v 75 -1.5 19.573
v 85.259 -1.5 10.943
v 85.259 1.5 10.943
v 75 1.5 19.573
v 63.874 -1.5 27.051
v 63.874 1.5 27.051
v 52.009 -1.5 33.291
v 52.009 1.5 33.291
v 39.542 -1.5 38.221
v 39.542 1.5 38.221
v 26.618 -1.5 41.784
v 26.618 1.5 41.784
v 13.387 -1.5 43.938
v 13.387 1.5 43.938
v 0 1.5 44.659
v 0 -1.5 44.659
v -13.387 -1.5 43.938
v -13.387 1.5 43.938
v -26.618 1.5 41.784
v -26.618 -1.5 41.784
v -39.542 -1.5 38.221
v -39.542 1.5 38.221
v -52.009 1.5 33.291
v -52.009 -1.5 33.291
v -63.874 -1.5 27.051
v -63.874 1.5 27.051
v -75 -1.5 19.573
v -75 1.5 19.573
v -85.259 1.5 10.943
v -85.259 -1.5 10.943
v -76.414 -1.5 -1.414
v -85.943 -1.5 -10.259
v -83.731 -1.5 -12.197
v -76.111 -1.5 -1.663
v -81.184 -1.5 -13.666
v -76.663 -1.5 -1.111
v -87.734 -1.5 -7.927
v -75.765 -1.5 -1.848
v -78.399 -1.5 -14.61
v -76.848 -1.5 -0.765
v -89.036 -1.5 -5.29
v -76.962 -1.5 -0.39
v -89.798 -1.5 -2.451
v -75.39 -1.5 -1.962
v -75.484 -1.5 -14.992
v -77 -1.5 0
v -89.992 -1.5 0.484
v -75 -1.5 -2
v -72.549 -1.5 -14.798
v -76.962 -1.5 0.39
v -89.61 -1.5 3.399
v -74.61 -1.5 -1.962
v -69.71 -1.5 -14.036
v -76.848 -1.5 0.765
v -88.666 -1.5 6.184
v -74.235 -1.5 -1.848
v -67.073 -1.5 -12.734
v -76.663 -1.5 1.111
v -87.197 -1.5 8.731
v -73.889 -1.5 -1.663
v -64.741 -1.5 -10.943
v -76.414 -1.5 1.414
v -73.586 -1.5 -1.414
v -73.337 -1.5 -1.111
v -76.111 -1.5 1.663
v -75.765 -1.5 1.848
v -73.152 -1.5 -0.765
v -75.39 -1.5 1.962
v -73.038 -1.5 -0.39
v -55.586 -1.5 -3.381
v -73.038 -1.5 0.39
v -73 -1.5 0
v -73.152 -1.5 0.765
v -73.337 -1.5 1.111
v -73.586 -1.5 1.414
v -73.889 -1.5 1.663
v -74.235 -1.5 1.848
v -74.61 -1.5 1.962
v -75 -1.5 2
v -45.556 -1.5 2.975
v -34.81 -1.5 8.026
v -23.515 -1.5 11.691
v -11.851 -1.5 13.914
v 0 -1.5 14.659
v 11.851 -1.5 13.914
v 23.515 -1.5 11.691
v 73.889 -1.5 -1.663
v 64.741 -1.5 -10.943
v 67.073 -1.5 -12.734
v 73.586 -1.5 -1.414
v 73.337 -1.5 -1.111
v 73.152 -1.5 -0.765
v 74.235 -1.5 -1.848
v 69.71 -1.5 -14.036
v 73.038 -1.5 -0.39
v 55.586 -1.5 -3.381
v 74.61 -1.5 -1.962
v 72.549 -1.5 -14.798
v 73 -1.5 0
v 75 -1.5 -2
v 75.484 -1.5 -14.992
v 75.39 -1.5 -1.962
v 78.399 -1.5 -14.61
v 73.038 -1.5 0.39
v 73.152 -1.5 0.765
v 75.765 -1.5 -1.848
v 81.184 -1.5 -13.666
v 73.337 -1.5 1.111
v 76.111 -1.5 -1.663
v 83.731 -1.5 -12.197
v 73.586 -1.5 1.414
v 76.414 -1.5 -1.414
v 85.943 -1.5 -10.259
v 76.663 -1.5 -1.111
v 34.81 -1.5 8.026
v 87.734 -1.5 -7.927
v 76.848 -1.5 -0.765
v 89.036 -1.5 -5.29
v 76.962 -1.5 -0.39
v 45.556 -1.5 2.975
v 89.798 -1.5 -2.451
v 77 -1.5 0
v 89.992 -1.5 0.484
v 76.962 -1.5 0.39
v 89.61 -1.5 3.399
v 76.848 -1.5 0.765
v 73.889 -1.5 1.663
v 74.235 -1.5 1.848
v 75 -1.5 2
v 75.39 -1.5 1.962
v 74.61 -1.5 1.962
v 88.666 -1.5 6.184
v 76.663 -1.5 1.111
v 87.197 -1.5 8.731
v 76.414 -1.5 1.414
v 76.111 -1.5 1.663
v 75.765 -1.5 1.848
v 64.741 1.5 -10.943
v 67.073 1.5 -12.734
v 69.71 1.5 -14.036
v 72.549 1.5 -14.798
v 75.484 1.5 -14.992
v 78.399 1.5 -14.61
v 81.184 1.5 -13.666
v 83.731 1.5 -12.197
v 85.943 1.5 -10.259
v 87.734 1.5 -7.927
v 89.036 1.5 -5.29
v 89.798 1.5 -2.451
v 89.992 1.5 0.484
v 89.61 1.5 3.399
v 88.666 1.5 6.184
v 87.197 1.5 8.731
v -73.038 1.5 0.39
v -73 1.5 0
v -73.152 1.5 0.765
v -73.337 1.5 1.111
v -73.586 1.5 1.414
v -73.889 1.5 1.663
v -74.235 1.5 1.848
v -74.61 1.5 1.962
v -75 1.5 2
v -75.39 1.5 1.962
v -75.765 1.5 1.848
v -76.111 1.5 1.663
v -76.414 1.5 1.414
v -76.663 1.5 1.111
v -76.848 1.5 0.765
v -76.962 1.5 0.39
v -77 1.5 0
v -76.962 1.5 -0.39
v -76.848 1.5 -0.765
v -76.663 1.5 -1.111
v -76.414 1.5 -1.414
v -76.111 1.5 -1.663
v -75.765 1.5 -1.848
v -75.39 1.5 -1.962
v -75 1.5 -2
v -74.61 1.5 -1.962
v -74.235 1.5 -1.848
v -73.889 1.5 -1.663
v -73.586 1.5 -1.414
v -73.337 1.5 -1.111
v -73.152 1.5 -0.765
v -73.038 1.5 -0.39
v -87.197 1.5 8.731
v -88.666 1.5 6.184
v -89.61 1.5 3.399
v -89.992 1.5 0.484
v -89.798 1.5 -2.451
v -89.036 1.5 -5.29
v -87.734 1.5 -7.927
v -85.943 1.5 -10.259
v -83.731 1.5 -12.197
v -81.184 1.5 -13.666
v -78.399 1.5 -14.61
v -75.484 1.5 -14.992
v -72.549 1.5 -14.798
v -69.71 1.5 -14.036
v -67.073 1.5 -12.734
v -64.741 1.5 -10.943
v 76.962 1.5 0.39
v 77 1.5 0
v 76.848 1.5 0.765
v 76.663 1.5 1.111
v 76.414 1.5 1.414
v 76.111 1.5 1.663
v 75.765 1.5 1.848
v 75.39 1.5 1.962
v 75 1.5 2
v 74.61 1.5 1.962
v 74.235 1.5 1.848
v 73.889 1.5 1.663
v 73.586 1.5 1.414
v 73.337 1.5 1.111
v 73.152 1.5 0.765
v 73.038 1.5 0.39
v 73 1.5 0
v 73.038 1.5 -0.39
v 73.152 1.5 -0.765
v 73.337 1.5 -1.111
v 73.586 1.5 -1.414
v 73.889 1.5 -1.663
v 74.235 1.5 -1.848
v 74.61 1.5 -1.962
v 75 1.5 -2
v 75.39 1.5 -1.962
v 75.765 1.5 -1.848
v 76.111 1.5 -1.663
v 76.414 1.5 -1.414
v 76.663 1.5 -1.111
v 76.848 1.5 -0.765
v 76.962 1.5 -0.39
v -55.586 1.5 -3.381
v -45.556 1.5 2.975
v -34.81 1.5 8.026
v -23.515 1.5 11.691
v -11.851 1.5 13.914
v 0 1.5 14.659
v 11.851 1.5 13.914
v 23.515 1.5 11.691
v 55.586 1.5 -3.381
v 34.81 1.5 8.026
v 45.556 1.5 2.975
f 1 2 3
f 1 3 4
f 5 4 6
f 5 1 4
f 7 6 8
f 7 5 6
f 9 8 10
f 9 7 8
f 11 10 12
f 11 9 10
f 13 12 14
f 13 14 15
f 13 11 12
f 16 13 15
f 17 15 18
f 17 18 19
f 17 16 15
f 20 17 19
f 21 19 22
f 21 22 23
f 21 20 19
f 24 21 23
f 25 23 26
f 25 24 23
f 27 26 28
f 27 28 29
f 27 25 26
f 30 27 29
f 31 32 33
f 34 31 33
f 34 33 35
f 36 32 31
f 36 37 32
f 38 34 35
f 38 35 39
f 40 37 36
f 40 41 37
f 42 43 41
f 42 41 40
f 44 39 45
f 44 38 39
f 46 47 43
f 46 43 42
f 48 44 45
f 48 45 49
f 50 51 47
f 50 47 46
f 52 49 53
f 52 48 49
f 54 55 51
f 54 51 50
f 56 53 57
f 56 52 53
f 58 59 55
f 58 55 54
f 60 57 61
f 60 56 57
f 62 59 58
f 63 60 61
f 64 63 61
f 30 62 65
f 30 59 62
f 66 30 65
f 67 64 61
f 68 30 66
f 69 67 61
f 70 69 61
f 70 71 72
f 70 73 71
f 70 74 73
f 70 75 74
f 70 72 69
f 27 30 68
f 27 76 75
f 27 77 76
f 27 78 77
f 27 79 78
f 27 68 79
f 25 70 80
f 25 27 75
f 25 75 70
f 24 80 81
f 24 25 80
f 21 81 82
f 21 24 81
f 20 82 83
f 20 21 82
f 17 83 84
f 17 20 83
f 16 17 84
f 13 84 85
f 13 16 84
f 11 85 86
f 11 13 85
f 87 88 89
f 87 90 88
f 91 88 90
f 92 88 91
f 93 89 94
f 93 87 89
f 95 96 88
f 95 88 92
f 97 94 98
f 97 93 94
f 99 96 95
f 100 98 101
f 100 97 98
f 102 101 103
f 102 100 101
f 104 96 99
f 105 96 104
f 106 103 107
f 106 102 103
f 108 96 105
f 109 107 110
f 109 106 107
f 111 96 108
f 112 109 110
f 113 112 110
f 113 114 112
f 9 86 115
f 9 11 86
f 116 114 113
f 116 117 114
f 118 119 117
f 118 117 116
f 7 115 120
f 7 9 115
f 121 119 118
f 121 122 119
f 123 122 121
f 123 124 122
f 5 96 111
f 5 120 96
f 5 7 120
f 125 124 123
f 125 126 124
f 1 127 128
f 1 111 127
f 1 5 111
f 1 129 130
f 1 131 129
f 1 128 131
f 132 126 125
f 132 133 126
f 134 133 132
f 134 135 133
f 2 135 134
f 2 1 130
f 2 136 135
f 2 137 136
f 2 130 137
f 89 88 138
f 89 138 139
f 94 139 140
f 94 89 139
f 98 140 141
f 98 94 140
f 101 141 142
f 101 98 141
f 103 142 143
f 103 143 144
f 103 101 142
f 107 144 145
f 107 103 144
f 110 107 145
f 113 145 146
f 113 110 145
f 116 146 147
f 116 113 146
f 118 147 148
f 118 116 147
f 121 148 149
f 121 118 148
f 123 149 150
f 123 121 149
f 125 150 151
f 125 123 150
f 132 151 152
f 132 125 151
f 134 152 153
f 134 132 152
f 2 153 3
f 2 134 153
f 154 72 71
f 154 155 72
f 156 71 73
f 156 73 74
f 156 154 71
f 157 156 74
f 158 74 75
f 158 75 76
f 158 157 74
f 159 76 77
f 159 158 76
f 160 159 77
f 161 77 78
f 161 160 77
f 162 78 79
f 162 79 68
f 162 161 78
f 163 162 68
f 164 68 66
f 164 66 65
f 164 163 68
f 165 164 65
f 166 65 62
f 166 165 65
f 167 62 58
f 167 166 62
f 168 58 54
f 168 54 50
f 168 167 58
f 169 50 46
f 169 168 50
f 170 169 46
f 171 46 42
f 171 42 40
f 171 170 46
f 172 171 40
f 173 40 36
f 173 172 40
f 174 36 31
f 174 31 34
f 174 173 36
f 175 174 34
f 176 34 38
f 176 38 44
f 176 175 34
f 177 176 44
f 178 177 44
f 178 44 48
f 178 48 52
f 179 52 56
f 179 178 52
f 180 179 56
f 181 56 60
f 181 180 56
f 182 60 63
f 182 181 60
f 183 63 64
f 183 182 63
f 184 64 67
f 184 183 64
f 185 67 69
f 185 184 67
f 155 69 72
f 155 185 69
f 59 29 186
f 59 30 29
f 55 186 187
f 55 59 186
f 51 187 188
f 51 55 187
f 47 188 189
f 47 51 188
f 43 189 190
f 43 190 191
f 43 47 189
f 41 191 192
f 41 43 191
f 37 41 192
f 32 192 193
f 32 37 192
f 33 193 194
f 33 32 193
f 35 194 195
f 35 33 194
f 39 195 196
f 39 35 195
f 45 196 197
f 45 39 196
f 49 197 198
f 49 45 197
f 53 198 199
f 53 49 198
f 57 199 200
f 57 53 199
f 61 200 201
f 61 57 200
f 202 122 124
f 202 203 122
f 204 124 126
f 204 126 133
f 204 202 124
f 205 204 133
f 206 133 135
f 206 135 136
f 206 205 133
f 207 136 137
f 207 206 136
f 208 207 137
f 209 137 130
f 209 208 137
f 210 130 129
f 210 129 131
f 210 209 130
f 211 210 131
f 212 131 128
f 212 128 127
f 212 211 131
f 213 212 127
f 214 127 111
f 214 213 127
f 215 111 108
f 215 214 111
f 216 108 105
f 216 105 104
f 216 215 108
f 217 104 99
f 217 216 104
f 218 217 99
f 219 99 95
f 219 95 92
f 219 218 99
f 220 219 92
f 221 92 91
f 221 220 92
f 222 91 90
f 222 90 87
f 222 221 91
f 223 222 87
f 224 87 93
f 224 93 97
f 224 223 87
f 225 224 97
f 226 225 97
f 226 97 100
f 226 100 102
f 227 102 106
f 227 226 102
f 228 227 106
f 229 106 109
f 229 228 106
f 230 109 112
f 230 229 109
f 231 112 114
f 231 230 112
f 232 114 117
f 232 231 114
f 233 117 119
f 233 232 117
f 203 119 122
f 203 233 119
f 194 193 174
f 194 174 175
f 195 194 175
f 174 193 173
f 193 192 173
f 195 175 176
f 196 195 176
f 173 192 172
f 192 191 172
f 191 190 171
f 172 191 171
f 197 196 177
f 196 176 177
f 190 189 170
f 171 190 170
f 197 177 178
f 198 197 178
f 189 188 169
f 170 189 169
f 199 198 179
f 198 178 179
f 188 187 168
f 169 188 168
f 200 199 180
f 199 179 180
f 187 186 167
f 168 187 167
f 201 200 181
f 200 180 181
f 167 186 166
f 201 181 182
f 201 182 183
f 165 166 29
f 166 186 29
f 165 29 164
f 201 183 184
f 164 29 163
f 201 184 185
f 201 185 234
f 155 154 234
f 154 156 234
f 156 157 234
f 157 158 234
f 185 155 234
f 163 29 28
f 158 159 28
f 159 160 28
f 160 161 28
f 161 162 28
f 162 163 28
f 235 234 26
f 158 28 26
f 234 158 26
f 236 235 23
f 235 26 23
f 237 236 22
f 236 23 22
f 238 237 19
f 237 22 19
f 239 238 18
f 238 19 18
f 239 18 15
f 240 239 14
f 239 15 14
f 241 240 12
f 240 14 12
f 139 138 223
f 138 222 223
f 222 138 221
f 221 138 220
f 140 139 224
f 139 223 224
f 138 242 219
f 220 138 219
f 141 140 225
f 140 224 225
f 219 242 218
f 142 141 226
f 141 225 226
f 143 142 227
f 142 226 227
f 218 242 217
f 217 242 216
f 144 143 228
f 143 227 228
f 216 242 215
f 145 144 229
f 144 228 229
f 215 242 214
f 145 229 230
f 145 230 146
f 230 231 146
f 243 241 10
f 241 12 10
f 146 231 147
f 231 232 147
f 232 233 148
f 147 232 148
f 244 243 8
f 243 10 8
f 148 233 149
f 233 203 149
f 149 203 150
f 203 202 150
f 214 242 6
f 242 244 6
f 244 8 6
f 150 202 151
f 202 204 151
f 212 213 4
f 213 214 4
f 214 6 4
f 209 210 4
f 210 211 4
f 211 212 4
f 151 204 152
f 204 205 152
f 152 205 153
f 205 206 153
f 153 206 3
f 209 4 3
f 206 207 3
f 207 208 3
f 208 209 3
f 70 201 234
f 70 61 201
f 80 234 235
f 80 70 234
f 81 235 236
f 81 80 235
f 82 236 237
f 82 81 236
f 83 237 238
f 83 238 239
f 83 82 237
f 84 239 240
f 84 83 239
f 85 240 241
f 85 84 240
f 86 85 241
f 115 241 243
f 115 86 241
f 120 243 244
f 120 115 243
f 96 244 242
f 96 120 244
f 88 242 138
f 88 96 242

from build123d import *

# Parameters (mm, degrees)
F1_R     = 2
F2_DEPTH = 1.5


with BuildPart() as f2:
    # F1 (on Front) → F2 (new body, symmetric)
    with BuildSketch(Plane.XZ):
        with BuildLine():
            ThreePointArc((-64.7408830668, -10.9430580621), (0, 14.6585609973), (64.7408830668, -10.9430580621))
            ThreePointArc((64.7408830668, -10.9430580621), (85.9430580621, -10.2591169332), (85.2591169332, 10.9430580621))
            ThreePointArc((85.2591169332, 10.9430580621), (0, 44.6585609973), (-85.2591169332, 10.9430580621))
            ThreePointArc((-85.2591169332, 10.9430580621), (-85.9430580621, -10.2591169332), (-64.7408830668, -10.9430580621))
        make_face()
        with Locations((-75, 0)):
            Circle(F1_R, mode=Mode.SUBTRACT)
        with Locations((75, 0)):
            Circle(F1_R, mode=Mode.SUBTRACT)
    extrude(amount=F2_DEPTH, both=True)


solid = f2.part
